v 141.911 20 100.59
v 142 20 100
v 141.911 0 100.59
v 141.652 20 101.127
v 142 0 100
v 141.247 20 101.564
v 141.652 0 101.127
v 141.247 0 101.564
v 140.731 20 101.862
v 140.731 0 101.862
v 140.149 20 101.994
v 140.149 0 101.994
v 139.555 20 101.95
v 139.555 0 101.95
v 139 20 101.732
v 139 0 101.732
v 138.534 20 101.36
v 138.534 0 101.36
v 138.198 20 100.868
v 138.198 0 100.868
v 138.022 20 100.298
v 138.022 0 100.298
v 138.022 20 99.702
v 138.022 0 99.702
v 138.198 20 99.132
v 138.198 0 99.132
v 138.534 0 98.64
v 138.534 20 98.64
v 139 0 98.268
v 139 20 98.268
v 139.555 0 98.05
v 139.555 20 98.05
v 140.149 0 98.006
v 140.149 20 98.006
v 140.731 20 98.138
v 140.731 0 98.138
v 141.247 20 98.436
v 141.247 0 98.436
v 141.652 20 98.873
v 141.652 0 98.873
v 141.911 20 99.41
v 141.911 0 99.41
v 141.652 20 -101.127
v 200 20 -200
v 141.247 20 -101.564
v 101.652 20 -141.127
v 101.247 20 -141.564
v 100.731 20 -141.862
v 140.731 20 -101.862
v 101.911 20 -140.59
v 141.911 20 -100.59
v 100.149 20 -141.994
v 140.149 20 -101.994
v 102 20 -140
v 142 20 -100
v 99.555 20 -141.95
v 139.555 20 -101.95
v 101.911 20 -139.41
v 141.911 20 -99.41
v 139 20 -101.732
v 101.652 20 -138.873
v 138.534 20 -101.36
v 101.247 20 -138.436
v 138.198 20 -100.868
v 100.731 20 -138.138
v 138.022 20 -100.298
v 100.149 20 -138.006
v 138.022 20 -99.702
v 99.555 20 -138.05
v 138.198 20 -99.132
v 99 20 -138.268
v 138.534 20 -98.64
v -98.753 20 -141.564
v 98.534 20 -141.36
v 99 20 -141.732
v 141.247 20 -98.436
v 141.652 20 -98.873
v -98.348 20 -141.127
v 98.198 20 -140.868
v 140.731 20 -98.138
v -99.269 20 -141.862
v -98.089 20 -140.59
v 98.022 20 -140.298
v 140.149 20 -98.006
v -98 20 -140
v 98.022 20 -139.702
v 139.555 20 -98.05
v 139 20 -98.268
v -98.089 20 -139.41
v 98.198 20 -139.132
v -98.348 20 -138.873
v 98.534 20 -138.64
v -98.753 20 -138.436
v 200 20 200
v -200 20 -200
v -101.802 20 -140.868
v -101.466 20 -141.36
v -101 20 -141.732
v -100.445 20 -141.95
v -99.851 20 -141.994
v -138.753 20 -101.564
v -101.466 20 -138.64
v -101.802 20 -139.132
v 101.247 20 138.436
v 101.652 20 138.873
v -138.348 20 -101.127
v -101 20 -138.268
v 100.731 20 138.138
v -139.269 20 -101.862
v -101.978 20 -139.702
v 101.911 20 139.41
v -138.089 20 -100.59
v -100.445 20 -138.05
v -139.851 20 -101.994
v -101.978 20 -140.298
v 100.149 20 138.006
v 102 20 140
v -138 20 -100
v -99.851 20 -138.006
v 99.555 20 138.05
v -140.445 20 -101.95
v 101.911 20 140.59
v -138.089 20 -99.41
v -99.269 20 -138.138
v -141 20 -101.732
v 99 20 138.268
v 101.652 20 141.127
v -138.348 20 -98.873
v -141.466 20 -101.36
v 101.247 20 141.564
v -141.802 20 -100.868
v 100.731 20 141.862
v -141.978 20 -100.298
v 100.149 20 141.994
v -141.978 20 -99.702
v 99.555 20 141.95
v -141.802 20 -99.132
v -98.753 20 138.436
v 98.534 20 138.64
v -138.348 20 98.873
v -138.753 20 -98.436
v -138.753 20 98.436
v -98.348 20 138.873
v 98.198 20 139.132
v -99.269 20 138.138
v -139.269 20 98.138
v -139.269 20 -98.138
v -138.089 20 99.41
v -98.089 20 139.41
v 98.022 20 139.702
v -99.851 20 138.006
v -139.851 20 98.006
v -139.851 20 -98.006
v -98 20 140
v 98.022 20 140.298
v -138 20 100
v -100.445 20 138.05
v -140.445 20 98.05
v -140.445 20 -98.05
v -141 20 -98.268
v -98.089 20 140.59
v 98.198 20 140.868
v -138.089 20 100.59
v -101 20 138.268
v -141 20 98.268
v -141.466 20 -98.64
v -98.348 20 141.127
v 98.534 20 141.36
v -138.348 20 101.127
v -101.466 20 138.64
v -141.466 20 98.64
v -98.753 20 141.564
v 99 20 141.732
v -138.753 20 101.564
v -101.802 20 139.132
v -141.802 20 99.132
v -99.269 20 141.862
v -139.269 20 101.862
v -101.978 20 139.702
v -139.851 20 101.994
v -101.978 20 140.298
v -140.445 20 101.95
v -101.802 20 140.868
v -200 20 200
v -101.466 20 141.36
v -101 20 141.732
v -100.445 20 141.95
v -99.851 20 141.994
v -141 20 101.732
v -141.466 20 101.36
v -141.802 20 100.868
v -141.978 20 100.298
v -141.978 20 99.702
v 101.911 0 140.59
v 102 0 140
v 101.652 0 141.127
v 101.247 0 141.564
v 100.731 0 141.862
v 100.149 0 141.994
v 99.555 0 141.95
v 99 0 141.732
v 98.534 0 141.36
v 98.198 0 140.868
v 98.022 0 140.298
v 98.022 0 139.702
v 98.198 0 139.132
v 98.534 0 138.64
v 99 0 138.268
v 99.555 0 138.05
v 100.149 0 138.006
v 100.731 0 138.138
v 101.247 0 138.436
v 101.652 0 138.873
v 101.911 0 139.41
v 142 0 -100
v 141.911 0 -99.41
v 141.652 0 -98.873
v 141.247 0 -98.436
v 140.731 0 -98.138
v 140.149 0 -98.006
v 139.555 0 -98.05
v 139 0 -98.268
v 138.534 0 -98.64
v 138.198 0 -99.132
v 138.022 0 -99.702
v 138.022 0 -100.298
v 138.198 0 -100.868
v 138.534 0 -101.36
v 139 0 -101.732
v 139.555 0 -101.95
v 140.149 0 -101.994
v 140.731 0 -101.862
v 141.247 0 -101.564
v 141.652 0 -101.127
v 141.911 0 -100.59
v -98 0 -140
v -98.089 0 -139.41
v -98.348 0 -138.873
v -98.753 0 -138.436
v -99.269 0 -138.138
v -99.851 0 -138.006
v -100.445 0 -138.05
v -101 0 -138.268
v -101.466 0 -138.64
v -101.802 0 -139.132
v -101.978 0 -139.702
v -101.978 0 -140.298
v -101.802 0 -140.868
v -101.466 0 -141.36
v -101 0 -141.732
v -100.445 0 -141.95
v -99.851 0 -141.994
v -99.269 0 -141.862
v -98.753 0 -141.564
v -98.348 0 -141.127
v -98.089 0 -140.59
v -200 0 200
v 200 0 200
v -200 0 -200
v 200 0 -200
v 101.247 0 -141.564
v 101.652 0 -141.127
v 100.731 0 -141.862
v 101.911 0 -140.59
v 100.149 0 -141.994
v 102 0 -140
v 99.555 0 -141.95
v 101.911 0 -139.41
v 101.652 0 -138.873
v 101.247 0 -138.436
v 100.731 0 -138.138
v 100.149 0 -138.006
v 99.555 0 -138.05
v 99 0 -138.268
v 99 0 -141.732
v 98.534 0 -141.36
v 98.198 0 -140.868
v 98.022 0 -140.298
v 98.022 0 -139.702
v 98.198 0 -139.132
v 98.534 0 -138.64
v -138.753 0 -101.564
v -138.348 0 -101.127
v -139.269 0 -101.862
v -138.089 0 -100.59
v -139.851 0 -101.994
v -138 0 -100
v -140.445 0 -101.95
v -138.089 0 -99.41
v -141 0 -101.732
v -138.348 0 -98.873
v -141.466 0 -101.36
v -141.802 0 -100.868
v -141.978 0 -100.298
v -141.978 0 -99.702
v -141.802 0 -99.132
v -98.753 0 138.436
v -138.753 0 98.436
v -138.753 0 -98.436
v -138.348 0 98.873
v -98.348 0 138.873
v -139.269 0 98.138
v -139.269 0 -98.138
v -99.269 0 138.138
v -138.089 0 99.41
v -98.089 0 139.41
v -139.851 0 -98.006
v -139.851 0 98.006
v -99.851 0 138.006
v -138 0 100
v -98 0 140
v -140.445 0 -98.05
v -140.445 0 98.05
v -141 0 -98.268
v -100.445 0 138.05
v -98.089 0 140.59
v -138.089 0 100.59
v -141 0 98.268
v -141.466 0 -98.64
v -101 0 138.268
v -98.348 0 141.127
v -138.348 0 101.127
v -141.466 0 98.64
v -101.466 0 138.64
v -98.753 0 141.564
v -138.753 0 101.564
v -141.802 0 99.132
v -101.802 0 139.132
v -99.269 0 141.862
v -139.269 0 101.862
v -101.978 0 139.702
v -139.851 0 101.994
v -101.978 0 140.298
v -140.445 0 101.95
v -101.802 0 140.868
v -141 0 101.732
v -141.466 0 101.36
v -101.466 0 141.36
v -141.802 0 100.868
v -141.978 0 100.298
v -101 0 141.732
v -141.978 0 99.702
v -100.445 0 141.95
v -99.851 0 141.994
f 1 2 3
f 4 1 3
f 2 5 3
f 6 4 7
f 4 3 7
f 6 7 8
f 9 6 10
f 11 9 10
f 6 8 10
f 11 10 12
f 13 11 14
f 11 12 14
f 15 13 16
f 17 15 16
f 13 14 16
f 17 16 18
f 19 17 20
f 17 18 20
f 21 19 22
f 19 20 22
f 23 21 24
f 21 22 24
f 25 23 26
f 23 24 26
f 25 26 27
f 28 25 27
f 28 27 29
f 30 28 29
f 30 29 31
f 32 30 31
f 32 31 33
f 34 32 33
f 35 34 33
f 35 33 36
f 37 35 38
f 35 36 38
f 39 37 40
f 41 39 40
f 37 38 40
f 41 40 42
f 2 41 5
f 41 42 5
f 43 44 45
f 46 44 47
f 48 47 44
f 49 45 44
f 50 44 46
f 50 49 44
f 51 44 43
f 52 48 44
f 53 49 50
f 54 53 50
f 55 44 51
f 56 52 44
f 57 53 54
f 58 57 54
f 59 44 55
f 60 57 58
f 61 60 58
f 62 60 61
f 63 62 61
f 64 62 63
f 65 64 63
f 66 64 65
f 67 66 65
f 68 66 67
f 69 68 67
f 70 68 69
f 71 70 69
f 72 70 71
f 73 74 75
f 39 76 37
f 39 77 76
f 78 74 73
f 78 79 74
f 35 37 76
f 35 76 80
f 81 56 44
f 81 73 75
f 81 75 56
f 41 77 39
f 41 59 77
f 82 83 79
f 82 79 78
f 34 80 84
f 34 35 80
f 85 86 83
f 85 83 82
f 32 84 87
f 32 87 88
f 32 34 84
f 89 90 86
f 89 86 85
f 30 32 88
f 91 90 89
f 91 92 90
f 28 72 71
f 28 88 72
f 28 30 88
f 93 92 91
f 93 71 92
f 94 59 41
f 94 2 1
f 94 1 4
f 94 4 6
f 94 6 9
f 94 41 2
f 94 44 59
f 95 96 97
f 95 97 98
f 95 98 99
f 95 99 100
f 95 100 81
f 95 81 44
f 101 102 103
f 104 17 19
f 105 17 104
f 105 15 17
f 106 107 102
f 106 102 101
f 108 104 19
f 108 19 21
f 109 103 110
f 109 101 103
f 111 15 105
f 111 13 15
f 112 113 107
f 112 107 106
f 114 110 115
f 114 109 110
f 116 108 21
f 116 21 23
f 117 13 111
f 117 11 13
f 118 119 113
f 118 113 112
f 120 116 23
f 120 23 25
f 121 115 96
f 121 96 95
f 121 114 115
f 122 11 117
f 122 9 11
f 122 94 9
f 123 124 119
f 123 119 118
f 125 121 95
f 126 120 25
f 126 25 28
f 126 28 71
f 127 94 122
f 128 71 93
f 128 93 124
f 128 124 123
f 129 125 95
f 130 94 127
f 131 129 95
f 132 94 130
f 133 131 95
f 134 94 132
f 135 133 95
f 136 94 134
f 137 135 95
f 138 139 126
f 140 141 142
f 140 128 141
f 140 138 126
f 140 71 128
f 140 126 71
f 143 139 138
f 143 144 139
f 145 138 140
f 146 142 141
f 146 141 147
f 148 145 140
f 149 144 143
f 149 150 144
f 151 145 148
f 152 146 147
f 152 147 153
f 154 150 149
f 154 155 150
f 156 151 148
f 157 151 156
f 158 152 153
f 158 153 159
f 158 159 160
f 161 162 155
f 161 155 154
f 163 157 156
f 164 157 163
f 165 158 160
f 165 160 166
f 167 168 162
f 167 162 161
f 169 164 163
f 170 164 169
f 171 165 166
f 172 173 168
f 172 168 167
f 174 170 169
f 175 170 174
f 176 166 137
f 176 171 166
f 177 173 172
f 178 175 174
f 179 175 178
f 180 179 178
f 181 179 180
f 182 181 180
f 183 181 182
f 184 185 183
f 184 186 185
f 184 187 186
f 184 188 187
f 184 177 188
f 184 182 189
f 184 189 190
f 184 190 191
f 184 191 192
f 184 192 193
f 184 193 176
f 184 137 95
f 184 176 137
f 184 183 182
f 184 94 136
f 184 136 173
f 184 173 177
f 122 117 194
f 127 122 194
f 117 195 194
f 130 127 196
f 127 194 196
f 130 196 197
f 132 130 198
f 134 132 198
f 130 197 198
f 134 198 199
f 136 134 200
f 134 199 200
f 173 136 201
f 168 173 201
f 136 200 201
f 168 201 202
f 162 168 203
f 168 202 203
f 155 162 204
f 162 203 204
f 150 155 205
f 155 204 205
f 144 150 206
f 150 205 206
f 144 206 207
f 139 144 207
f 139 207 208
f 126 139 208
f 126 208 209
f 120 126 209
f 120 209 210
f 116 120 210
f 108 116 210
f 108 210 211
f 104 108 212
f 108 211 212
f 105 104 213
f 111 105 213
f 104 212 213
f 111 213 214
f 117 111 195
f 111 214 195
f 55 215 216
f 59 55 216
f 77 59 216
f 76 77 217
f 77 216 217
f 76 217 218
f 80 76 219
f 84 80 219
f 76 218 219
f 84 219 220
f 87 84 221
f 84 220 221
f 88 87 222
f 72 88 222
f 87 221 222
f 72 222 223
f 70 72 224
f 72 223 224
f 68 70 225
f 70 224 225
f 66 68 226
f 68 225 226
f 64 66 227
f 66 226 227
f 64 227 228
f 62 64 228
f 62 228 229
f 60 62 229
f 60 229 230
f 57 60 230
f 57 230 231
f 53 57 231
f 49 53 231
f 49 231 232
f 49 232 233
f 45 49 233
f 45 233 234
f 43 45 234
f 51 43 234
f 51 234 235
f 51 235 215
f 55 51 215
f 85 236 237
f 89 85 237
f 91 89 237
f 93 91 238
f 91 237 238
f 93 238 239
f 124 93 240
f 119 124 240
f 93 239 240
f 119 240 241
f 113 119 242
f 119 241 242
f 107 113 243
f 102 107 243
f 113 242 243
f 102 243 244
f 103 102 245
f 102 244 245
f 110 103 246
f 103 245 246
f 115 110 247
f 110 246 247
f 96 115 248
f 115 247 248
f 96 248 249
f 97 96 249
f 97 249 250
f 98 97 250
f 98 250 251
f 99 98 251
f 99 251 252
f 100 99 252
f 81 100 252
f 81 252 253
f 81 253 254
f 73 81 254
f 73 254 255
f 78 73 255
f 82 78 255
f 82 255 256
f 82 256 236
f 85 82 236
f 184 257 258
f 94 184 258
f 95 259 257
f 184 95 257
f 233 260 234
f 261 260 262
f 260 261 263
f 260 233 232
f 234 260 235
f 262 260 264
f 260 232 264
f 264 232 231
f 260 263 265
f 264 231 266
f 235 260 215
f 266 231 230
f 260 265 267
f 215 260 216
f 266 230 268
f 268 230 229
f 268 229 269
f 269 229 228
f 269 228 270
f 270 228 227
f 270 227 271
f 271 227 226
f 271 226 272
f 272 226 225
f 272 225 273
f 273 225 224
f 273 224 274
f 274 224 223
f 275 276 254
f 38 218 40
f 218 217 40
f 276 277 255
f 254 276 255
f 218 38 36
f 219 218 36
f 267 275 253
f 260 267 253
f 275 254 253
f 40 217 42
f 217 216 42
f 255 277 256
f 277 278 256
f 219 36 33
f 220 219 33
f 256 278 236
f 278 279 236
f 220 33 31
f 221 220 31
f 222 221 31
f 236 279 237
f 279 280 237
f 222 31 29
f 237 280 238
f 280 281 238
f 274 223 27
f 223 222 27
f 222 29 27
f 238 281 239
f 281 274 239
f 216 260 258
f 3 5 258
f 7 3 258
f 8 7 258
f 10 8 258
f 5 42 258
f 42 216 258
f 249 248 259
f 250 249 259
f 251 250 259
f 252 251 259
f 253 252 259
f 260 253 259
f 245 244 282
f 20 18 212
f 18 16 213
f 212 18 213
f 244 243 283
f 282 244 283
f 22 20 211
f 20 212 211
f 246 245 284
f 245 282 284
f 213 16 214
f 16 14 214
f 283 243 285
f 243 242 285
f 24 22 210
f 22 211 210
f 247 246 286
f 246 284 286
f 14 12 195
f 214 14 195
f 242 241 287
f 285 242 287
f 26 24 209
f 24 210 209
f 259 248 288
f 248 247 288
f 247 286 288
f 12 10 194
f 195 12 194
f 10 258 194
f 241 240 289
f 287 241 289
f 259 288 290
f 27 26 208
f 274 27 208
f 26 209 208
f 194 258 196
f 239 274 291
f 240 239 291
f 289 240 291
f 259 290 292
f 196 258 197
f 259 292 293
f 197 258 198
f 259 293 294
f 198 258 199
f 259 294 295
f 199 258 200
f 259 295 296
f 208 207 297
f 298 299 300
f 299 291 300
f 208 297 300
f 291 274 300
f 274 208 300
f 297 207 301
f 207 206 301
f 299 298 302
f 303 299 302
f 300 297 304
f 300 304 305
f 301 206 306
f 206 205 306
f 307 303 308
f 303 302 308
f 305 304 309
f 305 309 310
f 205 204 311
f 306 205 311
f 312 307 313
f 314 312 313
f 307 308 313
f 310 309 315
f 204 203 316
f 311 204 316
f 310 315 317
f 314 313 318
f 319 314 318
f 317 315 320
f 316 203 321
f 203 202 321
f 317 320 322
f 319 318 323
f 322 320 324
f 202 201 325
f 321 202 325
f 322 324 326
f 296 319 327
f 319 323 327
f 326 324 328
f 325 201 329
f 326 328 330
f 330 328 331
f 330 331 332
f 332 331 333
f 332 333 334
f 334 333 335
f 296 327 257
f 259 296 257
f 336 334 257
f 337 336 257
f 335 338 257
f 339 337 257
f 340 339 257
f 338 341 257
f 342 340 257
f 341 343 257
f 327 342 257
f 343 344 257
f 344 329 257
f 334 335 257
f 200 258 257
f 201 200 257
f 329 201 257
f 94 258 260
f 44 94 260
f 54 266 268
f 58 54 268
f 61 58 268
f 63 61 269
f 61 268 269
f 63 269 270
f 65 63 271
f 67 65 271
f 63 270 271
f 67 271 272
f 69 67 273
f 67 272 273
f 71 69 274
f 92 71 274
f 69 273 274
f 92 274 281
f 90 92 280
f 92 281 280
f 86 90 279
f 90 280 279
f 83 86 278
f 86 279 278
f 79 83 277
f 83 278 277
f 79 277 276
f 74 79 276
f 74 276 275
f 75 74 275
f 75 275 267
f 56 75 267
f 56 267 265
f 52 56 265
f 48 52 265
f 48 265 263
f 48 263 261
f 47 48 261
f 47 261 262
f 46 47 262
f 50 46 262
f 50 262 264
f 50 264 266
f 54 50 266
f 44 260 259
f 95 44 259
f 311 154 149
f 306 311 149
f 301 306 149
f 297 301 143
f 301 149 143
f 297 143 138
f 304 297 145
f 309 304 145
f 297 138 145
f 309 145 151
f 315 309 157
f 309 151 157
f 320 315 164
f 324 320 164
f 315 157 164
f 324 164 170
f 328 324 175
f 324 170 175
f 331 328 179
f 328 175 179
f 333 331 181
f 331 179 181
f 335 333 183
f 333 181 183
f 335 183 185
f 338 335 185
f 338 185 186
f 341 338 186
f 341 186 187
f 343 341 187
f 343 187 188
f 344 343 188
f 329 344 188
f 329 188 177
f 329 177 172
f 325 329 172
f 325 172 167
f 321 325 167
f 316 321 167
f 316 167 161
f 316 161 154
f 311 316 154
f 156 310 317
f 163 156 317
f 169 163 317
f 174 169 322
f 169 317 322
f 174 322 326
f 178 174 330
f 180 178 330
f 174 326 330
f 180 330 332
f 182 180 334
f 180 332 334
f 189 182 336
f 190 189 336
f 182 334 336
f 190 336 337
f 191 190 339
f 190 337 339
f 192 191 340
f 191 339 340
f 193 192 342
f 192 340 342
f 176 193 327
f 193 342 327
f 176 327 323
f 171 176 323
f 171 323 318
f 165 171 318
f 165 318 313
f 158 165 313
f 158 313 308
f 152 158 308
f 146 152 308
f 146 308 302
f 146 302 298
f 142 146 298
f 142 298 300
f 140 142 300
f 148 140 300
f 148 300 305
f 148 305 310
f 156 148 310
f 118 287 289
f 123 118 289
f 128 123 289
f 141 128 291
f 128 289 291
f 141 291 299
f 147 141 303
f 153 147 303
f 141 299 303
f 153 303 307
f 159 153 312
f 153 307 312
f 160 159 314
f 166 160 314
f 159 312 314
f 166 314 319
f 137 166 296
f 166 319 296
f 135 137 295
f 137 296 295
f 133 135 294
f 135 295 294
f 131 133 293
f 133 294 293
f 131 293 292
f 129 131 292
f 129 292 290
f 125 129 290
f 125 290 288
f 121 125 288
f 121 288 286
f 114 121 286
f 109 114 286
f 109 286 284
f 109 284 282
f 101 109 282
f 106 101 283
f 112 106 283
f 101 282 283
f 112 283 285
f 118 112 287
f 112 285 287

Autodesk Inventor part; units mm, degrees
ref_plane "YZ Plane" through (0, 0, 0) normal (1, 0, 0) x (0, 1, 0)
ref_plane "XZ Plane" through (0, 0, 0) normal (0, 1, 0) x (-1, 0, 0)
ref_plane "XY Plane" through (0, 0, 0) normal (0, 0, 1) x (1, 0, 0)
sketch "草图1" plane through (0, 0, 0) normal (0, 1, 0) x (-1, 0, 0)
  line L0 (200, 200) -> (-200, 200)
  line L1 (-200, 200) -> (-200, -200)
  line L2 (-200, -200) -> (200, -200)
  line L3 (200, -200) -> (200, 200)
  point P0 (0, 0)
  dimension "d0" = 400
  dimension "d1" = 400
extrude "拉伸1" add sketch "草图1" along normal blind 20
sketch "草图2" plane through (0, 20, 0) normal (0, 1, 0) x (1, 0, 0)
  circle A0 centre (-100, -140) radius 2
  point P0 (0, 0)
  dimension "d4" = 4
extrude "拉伸2" cut sketch "草图2" against normal blind 20
sketch "草图3" plane through (0, 0, 0) normal (0, -1, 0) x (1, 0, 0)
  circle A0 centre (140, 100) radius 2
  point P0 (0, 0)
  dimension "d7" = 4
extrude "拉伸3" cut sketch "草图3" against normal blind 20
sketch "草图4" plane through (0, 0, 0) normal (0, -1, 0) x (1, 0, 0)
  circle A0 centre (100, 140) radius 2
  point P0 (0, 0)
  dimension "d10" = 4
extrude "拉伸4" cut sketch "草图4" against normal blind 20
sketch "草图5" plane through (0, 0, 0) normal (0, -1, 0) x (1, 0, 0)
  circle A0 centre (-140, 100) radius 2
  point P0 (0, 0)
  dimension "d13" = 4
extrude "拉伸5" cut sketch "草图5" against normal blind 20
sketch "草图6" plane through (0, 0, 0) normal (0, -1, 0) x (1, 0, 0)
  circle A0 centre (140, -100) radius 2
  point P0 (0, 0)
  dimension "d16" = 4
extrude "拉伸6" cut sketch "草图6" against normal through all
sketch "草图7" plane through (0, 0, 0) normal (0, -1, 0) x (1, 0, 0)
  circle A0 centre (100, -140) radius 2
  point P0 (0, 0)
  dimension "d19" = 4
extrude "拉伸7" cut sketch "草图7" against normal through all
sketch "草图8" plane through (0, 0, 0) normal (0, -1, 0) x (1, 0, 0)
  circle A0 centre (-140, -100) radius 2
  point P0 (0, 0)
  dimension "d22" = 4
extrude "拉伸8" cut sketch "草图8" against normal through all
sketch "草图9" plane through (0, 0, 0) normal (0, -1, 0) x (1, 0, 0)
  circle A0 centre (-100, -140) radius 2
  point P0 (0, 0)
  dimension "d25" = 4
extrude "拉伸9" cut sketch "草图9" against normal through all
properties part number "底板"
